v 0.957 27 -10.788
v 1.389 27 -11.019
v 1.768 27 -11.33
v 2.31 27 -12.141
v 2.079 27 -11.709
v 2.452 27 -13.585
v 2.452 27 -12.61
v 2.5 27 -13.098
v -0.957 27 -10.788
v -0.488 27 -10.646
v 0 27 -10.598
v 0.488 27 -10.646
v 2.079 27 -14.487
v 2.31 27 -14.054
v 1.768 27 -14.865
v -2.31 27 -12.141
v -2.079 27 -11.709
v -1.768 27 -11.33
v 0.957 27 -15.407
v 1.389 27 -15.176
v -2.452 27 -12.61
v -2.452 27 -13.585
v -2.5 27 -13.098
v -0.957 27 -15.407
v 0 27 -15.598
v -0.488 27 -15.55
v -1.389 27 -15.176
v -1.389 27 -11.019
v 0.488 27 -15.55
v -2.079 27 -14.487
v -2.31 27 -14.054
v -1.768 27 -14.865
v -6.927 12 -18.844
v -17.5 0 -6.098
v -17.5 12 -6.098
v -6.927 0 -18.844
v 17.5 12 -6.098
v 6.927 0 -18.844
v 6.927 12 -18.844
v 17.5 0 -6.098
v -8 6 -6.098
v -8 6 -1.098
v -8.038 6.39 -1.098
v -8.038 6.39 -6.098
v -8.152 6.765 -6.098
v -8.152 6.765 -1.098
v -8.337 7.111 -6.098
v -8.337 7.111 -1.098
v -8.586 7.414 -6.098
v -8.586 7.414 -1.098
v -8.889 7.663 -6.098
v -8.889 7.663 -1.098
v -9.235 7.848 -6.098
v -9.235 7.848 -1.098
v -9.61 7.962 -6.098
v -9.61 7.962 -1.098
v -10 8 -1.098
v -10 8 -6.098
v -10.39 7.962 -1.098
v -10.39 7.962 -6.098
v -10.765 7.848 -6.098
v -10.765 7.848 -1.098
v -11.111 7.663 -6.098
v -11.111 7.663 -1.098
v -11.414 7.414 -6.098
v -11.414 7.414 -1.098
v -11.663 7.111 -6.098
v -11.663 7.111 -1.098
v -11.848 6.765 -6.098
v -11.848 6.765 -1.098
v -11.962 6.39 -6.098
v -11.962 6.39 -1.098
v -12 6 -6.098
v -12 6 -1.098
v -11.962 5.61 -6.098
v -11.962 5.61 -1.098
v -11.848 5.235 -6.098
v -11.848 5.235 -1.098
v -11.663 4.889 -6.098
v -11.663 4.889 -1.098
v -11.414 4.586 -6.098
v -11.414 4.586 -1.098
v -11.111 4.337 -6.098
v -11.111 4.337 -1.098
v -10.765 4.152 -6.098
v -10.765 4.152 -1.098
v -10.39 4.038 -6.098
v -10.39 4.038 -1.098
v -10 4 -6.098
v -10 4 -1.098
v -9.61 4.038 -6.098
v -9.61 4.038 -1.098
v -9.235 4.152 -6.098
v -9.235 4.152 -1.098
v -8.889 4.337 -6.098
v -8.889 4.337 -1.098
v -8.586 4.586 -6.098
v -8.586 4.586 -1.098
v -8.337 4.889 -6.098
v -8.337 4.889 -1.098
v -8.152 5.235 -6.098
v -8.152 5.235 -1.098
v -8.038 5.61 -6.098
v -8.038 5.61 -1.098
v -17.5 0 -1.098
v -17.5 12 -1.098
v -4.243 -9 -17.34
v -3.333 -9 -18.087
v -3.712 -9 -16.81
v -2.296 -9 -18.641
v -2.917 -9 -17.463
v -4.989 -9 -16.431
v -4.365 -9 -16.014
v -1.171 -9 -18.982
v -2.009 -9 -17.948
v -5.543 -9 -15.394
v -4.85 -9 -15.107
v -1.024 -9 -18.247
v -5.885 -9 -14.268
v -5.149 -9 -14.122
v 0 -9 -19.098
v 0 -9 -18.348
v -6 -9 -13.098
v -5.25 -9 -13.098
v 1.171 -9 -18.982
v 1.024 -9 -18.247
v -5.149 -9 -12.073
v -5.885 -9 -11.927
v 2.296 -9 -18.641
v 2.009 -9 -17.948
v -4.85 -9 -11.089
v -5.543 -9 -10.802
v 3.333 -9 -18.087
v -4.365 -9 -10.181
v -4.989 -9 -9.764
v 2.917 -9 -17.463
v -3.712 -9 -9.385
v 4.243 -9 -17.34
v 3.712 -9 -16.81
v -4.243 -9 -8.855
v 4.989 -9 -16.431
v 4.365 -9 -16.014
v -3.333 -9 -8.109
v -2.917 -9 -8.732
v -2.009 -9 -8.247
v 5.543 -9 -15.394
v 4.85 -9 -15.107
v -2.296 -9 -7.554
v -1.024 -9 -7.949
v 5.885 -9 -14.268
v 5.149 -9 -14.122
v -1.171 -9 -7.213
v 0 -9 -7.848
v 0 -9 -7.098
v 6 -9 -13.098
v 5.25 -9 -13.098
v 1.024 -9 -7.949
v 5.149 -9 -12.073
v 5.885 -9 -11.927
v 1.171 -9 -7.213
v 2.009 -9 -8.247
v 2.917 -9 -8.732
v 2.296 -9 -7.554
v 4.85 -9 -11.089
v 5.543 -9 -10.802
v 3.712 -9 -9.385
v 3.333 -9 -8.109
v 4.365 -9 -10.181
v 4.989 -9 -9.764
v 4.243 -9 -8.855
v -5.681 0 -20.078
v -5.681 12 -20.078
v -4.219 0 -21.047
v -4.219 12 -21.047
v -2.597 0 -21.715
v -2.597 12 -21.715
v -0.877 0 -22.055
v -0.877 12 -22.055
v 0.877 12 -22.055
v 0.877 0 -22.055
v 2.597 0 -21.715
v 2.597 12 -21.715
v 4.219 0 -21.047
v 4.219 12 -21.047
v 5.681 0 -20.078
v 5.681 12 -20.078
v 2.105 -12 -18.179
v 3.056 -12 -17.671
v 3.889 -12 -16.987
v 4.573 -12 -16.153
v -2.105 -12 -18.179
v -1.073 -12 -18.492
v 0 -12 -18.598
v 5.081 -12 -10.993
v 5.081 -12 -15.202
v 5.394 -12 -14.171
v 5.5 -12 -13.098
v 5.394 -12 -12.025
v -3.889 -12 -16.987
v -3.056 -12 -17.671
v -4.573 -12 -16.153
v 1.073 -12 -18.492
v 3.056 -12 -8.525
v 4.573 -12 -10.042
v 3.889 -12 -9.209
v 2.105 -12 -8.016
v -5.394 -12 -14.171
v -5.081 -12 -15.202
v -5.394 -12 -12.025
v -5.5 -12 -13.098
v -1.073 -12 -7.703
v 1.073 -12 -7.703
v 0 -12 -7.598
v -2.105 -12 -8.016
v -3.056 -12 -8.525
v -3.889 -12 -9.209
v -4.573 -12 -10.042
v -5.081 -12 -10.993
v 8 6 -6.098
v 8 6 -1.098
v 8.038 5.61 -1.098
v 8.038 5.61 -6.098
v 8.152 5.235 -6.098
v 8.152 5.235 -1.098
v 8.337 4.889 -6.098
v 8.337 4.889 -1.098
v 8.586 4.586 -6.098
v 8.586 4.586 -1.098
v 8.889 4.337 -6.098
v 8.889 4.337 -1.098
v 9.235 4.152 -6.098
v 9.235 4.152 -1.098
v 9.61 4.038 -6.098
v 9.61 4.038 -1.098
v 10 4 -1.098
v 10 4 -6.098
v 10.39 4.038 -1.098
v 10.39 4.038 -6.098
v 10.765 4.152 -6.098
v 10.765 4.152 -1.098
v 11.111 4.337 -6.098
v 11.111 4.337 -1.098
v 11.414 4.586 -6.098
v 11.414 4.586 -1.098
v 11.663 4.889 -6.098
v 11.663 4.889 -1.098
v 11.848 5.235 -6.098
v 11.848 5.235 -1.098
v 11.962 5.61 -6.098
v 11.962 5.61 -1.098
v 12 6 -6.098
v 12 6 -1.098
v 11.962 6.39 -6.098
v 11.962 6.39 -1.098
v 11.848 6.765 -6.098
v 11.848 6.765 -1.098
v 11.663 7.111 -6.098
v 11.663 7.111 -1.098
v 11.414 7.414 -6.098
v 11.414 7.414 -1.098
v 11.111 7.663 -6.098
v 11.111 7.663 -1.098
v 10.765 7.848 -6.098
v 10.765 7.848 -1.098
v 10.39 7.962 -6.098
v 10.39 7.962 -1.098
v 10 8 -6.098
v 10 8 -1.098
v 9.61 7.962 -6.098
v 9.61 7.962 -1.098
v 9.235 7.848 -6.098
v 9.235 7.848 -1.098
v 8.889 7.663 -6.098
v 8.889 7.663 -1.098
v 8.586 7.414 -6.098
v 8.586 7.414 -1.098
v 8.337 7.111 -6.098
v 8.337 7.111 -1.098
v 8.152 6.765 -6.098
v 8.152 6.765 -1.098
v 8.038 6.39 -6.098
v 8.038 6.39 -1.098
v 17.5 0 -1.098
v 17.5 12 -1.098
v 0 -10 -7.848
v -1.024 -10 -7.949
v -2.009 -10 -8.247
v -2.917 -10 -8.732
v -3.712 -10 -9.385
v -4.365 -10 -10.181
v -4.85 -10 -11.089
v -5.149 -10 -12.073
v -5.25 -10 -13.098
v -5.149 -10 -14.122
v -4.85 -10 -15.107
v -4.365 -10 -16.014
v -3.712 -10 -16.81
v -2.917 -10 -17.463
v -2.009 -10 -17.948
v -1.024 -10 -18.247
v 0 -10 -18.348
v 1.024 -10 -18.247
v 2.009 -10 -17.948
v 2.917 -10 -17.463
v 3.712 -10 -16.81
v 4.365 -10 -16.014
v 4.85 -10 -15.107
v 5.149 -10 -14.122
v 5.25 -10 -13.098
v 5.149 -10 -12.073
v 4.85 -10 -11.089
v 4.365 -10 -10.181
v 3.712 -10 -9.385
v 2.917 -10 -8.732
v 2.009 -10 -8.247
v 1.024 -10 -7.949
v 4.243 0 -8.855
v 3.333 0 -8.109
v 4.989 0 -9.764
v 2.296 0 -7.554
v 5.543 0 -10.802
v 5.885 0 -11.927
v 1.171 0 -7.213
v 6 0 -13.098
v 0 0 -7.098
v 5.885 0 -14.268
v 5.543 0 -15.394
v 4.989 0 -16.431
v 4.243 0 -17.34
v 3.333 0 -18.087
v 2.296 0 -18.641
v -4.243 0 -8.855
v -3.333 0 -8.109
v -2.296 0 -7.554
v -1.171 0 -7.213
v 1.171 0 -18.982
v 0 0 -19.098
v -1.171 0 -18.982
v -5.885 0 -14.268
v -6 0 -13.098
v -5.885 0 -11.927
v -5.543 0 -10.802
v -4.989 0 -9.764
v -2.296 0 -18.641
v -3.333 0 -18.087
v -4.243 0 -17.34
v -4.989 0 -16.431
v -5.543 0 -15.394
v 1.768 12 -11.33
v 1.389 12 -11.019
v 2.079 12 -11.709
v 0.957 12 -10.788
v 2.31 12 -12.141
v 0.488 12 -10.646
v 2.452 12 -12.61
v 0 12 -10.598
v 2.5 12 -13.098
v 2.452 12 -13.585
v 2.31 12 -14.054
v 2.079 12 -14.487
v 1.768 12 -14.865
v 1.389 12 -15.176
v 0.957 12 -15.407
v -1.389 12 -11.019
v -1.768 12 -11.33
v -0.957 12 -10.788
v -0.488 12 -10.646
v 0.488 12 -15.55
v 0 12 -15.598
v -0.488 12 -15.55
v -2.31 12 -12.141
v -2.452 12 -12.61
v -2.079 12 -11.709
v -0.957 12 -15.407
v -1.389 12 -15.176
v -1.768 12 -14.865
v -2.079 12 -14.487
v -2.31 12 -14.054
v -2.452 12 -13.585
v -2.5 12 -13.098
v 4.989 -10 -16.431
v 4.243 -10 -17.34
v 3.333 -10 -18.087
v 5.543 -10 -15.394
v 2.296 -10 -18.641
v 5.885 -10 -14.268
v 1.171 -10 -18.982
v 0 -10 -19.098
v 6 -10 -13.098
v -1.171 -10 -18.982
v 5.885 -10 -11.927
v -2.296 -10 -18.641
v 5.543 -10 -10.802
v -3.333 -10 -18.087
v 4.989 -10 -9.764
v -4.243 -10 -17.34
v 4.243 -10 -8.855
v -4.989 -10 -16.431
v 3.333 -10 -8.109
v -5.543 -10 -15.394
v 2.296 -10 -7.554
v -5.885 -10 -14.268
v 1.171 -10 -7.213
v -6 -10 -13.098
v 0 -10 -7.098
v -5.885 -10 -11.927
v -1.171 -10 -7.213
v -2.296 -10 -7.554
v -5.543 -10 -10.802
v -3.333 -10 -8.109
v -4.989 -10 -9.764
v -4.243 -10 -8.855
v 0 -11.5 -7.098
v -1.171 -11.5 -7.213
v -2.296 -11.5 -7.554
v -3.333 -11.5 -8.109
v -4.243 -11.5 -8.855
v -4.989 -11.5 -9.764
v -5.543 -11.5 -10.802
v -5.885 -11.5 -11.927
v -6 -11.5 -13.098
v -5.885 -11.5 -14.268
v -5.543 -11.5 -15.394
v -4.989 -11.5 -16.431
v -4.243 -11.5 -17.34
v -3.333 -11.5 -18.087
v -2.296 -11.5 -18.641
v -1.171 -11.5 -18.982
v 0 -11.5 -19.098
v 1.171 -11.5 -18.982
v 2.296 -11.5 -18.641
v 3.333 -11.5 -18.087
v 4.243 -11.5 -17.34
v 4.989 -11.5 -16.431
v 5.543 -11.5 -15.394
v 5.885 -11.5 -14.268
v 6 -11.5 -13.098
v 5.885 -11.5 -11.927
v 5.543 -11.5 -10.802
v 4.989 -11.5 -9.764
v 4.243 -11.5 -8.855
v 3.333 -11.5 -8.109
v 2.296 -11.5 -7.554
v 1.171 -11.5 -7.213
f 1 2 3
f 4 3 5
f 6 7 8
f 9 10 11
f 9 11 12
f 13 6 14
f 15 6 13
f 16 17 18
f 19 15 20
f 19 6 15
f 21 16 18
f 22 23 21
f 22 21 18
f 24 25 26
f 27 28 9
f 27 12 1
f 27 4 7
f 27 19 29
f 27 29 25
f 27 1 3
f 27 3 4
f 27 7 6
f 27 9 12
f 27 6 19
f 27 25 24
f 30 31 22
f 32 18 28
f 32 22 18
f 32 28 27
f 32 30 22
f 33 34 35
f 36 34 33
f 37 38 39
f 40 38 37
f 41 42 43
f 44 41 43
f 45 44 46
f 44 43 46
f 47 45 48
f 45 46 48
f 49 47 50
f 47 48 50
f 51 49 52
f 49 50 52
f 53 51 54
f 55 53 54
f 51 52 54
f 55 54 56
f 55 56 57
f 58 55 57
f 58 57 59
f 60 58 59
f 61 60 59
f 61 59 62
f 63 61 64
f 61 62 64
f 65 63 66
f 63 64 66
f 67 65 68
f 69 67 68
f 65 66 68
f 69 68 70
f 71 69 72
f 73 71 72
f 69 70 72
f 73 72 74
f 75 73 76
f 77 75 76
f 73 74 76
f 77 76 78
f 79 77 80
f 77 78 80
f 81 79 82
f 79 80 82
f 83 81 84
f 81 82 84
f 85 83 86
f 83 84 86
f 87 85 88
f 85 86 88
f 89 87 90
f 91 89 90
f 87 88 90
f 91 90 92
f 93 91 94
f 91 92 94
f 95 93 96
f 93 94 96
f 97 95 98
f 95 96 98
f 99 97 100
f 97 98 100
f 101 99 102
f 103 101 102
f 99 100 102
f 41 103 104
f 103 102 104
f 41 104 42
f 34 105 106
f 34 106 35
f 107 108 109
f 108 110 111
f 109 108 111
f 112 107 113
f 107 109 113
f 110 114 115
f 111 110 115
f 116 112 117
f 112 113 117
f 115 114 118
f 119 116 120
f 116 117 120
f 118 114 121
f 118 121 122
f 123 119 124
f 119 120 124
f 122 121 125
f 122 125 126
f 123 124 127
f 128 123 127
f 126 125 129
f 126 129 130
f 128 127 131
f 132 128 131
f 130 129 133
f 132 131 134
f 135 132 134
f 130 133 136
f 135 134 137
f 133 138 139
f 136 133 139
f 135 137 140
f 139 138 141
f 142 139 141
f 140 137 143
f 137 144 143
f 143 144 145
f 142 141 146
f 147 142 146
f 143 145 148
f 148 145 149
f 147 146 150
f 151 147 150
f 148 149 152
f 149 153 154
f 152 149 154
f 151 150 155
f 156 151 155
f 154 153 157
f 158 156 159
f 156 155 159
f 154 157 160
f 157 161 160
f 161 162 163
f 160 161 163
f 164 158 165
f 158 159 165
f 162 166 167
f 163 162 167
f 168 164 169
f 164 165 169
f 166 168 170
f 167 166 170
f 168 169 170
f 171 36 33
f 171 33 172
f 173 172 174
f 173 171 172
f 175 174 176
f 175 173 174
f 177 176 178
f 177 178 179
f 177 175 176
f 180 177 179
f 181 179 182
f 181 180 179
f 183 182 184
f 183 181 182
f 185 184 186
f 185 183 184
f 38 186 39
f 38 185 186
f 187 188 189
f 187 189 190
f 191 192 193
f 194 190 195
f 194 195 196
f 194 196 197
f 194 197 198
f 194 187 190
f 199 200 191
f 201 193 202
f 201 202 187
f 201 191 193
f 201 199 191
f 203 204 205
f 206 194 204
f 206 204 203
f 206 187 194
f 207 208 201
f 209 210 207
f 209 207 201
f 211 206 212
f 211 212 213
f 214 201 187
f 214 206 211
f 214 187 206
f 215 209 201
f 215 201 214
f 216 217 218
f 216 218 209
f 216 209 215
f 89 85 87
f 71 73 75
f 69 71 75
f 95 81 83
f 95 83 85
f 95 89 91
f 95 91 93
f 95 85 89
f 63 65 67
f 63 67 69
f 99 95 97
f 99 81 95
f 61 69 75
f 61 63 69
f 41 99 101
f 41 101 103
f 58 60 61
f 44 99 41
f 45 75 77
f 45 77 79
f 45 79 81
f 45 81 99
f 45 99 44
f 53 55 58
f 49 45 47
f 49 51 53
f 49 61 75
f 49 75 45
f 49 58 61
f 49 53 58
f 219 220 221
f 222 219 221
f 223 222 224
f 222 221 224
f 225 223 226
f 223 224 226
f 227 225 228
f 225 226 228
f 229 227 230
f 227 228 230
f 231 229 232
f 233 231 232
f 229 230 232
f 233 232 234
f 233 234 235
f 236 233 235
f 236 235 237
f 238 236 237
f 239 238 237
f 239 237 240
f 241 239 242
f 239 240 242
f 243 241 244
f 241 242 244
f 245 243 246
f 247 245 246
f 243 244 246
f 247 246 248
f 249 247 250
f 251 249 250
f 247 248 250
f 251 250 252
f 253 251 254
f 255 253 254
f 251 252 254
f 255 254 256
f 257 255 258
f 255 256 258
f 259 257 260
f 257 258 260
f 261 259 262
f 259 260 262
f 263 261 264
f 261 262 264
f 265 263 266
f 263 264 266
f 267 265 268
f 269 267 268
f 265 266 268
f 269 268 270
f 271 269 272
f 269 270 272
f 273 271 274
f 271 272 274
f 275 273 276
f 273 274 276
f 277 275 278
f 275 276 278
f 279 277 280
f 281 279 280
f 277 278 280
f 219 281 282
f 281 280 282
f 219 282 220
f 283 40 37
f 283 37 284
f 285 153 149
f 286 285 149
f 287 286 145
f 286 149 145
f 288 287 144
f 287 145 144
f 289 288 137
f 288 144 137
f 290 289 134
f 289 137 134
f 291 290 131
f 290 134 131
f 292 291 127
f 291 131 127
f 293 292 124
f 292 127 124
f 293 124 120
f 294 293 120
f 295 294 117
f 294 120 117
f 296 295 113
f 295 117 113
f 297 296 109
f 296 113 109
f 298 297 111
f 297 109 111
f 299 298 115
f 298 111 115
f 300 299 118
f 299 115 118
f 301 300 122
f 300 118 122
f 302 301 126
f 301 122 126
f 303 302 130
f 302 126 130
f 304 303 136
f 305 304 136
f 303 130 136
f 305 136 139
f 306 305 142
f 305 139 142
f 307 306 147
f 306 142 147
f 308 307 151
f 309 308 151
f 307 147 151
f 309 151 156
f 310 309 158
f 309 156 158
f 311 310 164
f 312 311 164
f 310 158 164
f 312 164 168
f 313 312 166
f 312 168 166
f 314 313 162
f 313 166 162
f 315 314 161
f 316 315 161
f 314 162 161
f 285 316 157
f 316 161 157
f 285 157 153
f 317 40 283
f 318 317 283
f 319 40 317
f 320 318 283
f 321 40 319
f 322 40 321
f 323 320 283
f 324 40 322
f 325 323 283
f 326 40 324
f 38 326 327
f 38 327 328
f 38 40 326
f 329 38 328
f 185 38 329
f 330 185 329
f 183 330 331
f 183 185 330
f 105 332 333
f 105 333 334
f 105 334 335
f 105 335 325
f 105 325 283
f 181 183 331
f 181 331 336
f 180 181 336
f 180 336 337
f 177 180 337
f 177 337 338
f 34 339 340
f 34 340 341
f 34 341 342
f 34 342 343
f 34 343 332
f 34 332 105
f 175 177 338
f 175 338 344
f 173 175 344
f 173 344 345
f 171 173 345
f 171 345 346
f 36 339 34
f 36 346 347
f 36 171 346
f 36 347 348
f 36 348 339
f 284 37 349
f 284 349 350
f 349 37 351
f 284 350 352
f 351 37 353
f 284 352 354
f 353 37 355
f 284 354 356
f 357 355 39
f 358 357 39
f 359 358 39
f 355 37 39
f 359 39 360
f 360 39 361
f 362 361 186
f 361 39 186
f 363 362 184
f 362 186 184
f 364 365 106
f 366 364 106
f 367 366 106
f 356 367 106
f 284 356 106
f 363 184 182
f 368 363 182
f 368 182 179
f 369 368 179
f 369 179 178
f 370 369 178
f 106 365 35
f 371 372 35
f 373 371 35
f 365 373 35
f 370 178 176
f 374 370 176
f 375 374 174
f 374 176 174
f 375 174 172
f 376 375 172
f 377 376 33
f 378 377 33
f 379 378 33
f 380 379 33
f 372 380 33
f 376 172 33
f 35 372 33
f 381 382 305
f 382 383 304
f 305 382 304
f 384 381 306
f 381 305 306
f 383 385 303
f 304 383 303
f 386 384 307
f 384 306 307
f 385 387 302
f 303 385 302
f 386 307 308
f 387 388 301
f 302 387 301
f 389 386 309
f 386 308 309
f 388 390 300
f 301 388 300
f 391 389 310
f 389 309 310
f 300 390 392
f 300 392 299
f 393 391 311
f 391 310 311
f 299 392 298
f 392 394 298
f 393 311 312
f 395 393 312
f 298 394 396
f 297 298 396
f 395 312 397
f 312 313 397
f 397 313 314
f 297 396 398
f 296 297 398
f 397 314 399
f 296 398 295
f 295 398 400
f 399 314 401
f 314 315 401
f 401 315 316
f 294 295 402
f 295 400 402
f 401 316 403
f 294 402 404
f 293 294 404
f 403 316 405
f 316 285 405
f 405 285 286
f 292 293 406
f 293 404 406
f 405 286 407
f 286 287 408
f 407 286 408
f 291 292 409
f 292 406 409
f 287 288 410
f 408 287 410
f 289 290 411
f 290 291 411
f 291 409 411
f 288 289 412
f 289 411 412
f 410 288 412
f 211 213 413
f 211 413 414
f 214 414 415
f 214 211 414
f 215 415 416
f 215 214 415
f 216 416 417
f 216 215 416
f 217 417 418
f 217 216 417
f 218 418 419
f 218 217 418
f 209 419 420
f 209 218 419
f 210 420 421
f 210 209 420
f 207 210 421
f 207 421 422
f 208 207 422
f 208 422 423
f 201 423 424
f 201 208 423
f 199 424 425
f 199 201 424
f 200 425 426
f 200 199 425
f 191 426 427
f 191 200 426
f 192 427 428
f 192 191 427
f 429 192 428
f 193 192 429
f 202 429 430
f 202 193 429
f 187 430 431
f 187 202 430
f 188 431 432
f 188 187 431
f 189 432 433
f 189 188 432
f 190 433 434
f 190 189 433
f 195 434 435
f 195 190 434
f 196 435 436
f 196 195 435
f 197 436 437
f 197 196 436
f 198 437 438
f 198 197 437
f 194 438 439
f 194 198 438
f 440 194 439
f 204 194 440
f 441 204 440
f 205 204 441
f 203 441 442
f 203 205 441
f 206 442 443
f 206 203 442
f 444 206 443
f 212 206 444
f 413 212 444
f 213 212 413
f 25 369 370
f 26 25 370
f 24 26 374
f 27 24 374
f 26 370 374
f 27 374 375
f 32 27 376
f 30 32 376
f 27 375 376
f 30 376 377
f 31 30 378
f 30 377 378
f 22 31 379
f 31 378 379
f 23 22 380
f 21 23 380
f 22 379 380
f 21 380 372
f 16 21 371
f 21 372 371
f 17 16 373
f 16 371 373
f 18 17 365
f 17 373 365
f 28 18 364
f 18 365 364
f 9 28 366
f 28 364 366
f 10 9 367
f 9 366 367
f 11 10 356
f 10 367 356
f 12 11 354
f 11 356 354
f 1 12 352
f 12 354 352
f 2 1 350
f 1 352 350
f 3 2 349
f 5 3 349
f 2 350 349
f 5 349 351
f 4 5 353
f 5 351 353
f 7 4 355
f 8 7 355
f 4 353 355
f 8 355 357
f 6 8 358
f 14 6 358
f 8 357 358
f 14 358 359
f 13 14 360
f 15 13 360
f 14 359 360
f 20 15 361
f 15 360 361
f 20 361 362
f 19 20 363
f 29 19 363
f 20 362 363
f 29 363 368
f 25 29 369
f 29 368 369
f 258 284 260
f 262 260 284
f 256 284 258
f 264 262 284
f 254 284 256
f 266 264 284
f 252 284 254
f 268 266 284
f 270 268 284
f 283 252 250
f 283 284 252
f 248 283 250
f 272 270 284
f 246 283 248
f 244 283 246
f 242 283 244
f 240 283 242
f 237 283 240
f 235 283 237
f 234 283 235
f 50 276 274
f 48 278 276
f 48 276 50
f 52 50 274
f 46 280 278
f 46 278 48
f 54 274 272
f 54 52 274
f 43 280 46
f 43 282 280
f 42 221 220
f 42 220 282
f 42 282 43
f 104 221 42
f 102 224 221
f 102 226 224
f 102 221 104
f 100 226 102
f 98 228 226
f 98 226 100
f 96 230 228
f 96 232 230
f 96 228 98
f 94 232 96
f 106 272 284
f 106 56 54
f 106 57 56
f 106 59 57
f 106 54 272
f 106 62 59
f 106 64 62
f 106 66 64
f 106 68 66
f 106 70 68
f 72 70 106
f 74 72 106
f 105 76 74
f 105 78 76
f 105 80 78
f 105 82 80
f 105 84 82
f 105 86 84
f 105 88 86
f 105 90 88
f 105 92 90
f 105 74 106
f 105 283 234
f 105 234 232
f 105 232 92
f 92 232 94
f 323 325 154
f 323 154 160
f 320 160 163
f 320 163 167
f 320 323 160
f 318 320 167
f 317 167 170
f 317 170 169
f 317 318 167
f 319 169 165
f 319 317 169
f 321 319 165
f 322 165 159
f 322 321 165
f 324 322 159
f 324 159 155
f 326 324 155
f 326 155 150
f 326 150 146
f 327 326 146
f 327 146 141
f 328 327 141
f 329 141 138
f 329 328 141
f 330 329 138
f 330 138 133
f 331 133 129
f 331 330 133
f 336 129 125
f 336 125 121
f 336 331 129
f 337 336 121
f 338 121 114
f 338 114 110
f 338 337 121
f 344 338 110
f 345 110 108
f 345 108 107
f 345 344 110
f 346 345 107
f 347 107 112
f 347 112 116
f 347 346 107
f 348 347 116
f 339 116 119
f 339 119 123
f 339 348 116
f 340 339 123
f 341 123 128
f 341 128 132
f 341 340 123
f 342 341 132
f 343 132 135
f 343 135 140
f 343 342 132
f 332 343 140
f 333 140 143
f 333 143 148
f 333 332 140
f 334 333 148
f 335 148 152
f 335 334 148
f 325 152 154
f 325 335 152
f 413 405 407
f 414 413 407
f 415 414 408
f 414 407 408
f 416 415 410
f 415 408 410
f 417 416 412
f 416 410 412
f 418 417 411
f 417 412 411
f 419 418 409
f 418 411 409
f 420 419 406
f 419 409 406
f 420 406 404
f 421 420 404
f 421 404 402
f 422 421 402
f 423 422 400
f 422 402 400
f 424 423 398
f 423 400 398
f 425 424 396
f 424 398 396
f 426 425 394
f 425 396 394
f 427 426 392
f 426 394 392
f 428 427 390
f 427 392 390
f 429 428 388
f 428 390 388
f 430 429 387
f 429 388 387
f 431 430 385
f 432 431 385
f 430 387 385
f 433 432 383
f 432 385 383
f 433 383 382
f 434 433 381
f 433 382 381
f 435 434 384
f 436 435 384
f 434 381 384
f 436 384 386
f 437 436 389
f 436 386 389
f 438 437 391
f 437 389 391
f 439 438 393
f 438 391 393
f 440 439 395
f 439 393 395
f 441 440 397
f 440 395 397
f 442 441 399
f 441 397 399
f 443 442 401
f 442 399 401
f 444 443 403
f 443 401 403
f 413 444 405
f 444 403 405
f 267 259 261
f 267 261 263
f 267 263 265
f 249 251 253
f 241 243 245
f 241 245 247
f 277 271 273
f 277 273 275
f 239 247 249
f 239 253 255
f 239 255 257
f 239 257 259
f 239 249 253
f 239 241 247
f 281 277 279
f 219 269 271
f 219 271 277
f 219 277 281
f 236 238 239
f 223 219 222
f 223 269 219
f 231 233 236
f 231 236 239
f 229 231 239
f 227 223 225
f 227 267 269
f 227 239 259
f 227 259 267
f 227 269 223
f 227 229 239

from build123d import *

# Parameters (mm, degrees)
EXTRUDE_1_DEPTH     = 12
SKETCH_2_R          = 6
EXTRUDE_2_DEPTH     = 9
SKETCH_3_R          = 5.25
EXTRUDE_3_DEPTH     = 1
SKETCH_4_R          = 6
EXTRUDE_4_DEPTH     = 2
CHAMFER_1_SIZE      = 0.5
SKETCH_5_R          = 2
CUT_EXTRUDE_1_DEPTH = 5
SKETCH_6_R          = 2.5
EXTRUDE_5_DEPTH     = 15


with BuildPart() as part:
    # 草图1 → 凸台-拉伸1 (new body)
    with BuildSketch(Plane(origin=(0, 0, 0), x_dir=(1, 0, 0), z_dir=(0, 1, 0))):
        with BuildLine():
            Line((-17.5, 6.09769995), (-6.926984364, 18.843732288))
            ThreePointArc((-6.926984364, 18.843732288), (0, 22.09769995), (6.926984364, 18.843732288))
            Line((6.926984364, 18.843732288), (17.5, 6.09769995))
            Line((17.5, 6.09769995), (17.5, 1.09769995))
            Line((17.5, 1.09769995), (-17.5, 1.09769995))
            Line((-17.5, 1.09769995), (-17.5, 6.09769995))
        make_face()
    extrude(amount=EXTRUDE_1_DEPTH)

    # 草图2 → 凸台-拉伸2 (add)
    with BuildSketch(Plane(origin=(0, 0, 0), x_dir=(1, 0, 0), z_dir=(0, 1, 0))):
        with Locations(Location((0, 13.09769995, 0), (0, 0, 270))):
            Circle(SKETCH_2_R)
    extrude(amount=-EXTRUDE_2_DEPTH)

    # 草图3 → 凸台-拉伸3 (add)
    with BuildSketch(Plane(origin=(0, -9, 0), x_dir=(-1, 0, 0), z_dir=(0, -1, 0))):
        with Locations(Location((0, 13.09769995, 0), (0, 0, 270))):
            Circle(SKETCH_3_R)
    extrude(amount=EXTRUDE_3_DEPTH)

    # 草图4 → 凸台-拉伸4 (add)
    with BuildSketch(Plane(origin=(0, -10, 0), x_dir=(-1, 0, 0), z_dir=(0, -1, 0))):
        with Locations(Location((0, 13.09769995, 0), (0, 0, 270))):
            Circle(SKETCH_4_R)
    extrude(amount=EXTRUDE_4_DEPTH)

    # 倒角1
    chamfer_1_edges = [part.edges().sort_by_distance(p)[0] for p in [
        (0, -12, -19.09769995),
    ]]
    chamfer(chamfer_1_edges, length=CHAMFER_1_SIZE)

    # 草图5 → 切除-拉伸1 (cut)
    with BuildSketch(Plane.XY.offset(-1.09769995)):
        with Locations((-10, 6)):
            Circle(SKETCH_5_R)
        with Locations(Location((10, 6, 0), (0, 0, 180))):
            Circle(SKETCH_5_R)
    extrude(amount=-CUT_EXTRUDE_1_DEPTH, mode=Mode.SUBTRACT)

    # 草图6 → 凸台-拉伸5 (add)
    with BuildSketch(Plane(origin=(0, 12, 0), x_dir=(1, 0, 0), z_dir=(0, 1, 0))):
        with Locations(Location((0, 13.09769995, 0), (0, 0, 90))):
            Circle(SKETCH_6_R)
    extrude(amount=EXTRUDE_5_DEPTH)


solid = part.part
